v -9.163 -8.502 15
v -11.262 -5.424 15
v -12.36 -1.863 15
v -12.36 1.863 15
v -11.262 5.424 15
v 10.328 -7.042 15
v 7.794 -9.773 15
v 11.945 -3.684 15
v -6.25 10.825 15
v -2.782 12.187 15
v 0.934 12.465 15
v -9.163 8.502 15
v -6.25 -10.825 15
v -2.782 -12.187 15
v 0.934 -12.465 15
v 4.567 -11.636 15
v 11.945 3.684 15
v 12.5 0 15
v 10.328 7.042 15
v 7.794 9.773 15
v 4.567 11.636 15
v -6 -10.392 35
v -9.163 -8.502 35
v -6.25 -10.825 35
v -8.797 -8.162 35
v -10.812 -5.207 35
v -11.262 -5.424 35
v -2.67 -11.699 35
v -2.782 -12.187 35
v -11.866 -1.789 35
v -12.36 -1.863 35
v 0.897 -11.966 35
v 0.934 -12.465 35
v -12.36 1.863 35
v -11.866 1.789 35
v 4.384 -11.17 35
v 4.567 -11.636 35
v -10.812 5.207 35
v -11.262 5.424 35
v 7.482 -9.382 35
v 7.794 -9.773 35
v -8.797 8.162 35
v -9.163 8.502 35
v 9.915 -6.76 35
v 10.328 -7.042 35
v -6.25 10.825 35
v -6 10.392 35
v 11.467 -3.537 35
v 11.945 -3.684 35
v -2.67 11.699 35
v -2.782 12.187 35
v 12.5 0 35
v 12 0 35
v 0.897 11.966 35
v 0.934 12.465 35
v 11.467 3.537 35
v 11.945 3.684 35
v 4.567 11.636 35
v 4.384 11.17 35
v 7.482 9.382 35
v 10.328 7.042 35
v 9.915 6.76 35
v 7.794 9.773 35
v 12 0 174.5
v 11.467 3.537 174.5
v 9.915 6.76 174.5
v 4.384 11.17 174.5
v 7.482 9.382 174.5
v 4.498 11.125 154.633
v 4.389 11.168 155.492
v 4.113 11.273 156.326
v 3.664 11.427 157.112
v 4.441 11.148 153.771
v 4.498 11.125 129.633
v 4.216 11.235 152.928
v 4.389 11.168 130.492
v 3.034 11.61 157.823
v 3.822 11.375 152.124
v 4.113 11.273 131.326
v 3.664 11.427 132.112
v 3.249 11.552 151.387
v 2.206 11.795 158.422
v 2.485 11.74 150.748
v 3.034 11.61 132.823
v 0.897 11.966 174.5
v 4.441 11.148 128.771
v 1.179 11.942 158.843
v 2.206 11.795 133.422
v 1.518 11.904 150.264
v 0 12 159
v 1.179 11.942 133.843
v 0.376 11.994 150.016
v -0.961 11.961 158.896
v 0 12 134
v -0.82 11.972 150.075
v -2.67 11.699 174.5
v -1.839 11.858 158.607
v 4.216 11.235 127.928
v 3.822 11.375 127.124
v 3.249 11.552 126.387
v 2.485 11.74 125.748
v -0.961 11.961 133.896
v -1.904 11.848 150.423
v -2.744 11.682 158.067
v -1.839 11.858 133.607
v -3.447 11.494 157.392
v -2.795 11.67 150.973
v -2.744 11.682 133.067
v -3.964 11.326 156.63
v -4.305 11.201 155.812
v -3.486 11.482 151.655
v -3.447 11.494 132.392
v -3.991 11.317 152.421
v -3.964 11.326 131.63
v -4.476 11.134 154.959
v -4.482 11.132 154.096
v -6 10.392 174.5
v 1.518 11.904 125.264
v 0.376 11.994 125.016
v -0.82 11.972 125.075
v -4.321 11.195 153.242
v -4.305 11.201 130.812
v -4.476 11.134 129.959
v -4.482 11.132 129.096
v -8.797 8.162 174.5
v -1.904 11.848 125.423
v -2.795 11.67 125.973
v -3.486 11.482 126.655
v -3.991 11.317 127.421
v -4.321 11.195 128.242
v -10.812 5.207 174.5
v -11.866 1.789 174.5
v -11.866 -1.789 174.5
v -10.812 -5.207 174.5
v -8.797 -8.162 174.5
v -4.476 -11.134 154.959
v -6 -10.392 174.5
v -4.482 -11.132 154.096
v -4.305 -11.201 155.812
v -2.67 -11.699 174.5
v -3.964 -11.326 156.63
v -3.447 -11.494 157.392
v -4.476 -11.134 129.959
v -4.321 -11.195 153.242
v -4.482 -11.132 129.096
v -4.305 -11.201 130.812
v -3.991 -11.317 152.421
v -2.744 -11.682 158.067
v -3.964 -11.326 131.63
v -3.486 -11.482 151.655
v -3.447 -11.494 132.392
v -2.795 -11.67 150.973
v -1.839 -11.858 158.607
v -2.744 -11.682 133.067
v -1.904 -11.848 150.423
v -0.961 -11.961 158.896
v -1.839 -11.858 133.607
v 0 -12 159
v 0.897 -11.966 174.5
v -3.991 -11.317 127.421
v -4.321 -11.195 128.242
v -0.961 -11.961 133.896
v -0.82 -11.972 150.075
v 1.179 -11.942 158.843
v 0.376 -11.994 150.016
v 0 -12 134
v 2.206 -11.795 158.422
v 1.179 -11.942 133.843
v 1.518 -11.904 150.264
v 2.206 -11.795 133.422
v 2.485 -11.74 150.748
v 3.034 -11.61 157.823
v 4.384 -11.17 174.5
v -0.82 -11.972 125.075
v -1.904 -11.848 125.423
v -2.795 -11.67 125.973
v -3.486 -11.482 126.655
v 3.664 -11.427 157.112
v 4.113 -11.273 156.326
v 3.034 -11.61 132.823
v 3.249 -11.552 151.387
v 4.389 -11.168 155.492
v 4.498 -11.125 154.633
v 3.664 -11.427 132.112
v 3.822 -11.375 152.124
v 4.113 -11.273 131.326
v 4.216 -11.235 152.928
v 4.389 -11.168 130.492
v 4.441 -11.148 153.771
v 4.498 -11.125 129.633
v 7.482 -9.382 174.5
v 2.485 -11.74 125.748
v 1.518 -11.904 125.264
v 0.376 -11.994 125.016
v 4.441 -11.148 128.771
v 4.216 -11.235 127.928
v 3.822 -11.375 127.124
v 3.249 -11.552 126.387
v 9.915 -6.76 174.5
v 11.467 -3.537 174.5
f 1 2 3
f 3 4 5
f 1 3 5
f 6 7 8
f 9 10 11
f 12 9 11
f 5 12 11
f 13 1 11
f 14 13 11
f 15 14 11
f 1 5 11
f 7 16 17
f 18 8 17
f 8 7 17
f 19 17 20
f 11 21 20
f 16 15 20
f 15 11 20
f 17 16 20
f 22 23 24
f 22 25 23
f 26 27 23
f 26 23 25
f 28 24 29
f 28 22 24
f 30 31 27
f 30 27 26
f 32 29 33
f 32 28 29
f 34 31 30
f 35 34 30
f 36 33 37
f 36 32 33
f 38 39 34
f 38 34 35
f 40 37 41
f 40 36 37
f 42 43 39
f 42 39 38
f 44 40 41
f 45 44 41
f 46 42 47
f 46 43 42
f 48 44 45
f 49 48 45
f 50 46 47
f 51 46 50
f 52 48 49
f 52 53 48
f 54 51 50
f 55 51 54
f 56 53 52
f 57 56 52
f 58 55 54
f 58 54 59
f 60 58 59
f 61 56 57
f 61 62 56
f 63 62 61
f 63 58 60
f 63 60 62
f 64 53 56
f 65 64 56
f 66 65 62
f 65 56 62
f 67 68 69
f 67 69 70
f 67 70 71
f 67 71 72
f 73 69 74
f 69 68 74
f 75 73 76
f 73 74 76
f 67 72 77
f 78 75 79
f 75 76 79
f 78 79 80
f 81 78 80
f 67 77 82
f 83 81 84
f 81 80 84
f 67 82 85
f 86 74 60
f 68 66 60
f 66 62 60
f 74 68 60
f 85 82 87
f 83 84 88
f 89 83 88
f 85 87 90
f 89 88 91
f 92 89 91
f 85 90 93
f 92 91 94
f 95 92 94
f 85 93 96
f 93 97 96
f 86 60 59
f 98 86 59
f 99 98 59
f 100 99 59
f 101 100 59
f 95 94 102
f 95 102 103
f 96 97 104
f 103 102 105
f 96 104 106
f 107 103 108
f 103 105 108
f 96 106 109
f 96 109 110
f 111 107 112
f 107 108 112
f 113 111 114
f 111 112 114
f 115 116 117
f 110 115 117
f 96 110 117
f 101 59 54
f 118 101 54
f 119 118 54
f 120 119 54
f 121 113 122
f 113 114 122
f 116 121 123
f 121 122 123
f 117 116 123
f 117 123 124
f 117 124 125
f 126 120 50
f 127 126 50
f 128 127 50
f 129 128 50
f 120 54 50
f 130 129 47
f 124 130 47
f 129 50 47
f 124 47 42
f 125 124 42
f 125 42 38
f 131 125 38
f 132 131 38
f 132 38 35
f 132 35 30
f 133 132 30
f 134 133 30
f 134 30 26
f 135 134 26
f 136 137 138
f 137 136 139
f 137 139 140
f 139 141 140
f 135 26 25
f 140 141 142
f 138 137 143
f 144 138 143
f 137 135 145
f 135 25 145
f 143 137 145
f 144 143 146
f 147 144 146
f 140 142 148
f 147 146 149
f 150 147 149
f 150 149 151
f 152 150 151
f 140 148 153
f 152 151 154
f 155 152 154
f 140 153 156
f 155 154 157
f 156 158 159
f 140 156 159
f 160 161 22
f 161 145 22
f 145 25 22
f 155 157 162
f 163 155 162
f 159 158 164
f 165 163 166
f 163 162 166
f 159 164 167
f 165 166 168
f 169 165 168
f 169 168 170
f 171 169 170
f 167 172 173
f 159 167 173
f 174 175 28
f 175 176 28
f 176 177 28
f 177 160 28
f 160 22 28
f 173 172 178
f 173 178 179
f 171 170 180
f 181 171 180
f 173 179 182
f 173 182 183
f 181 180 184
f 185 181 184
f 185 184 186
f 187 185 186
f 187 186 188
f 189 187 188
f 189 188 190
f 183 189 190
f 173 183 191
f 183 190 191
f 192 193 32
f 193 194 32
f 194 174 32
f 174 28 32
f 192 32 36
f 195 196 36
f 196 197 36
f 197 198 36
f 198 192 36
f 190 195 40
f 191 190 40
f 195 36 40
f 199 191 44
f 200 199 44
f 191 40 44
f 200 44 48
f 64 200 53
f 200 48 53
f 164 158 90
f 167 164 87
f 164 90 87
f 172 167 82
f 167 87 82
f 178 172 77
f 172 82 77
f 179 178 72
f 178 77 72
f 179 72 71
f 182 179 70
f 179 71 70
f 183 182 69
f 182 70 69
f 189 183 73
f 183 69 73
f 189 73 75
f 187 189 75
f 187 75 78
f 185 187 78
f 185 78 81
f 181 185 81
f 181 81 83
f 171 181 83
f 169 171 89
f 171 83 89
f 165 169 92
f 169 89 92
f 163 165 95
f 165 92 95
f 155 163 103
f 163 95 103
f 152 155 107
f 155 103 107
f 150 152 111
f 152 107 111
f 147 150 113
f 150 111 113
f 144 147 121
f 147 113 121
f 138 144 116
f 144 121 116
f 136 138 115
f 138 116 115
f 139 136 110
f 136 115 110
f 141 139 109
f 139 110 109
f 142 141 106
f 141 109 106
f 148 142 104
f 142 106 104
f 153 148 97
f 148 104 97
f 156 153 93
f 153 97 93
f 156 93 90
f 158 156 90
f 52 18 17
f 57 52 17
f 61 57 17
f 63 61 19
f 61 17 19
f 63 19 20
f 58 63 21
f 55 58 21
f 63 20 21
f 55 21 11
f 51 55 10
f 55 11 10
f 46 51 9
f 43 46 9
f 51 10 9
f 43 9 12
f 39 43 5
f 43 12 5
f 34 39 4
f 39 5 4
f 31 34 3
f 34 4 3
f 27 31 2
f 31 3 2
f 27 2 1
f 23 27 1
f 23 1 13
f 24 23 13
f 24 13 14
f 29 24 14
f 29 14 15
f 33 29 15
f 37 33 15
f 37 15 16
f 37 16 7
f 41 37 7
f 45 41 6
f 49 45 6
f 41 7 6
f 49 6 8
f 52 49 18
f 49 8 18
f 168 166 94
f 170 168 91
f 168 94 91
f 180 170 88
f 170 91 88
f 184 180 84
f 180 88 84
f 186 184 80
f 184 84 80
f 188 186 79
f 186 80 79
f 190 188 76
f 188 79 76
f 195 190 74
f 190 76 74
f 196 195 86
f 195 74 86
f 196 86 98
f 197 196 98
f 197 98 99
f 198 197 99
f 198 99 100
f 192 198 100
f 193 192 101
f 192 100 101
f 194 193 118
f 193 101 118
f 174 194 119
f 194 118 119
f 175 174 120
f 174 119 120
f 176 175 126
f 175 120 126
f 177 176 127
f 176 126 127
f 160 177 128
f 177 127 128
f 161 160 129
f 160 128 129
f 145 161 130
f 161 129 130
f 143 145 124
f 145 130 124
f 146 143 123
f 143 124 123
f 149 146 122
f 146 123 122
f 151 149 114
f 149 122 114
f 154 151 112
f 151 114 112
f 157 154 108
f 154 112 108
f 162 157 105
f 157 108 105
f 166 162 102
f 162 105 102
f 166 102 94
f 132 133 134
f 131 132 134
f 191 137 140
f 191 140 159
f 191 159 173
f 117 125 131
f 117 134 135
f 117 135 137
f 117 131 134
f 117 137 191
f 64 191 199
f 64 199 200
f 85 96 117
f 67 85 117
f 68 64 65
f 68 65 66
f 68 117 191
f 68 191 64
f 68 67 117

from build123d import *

# Parameters (mm, degrees)
SKETCH1_R               = 10
BOSS_EXTRUDE1_DEPTH     = 15
SKETCH2_R               = 12.5
BOSS_EXTRUDE2_DEPTH     = 20
SKETCH3_R               = 12
BOSS_EXTRUDE3_DEPTH     = 139.5
SKETCH4_R               = 4.5
CUT_EXTRUDE1_DEPTH      = 176.393129854
CUT_EXTRUDE2_DEPTH      = 176.393129954
CUT_EXTRUDE2_DEPTH_BACK = 176.393129954
SKETCH5_W               = 50.129657838
SKETCH5_H               = 19.874218845
LPATTERN1_COUNT         = 2
LPATTERN1_PITCH         = 25


with BuildPart() as part:
    # Sketch1 → Boss-Extrude1 (new body)
    with BuildSketch(Plane.XY):
        Circle(SKETCH1_R)
    extrude(amount=BOSS_EXTRUDE1_DEPTH)

    # Sketch2 → Boss-Extrude2 (add)
    with BuildSketch(Plane.XY.offset(15)):
        Circle(SKETCH2_R)
    extrude(amount=BOSS_EXTRUDE2_DEPTH)

    # Sketch3 → Boss-Extrude3 (add)
    with BuildSketch(Plane.XY.offset(35)):
        Circle(SKETCH3_R)
    extrude(amount=BOSS_EXTRUDE3_DEPTH)

    # Sketch4 → Cut-Extrude1 (cut, symmetric)
    with BuildSketch(Plane(origin=(0, 0, 0), x_dir=(1, 0, 0), z_dir=(0, 1, 0))):
        with Locations(Location((0, -154.5, 0), (0, 0, 270))):
            Circle(SKETCH4_R)
    cut_extrude1 = extrude(amount=CUT_EXTRUDE1_DEPTH, both=True, mode=Mode.SUBTRACT)

    # Sketch5 → Cut-Extrude2 (cut, two sides: drawn at the far end of the back side and taken through both)
    with BuildSketch(Plane(origin=(0, 0, 0), x_dir=(1, 0, 0), z_dir=(0, 1, 0)).offset(-CUT_EXTRUDE2_DEPTH_BACK)):
        with Locations((-12.564828919, -5.062890578)):
            Rectangle(SKETCH5_W, SKETCH5_H)
    extrude(amount=CUT_EXTRUDE2_DEPTH + CUT_EXTRUDE2_DEPTH_BACK, mode=Mode.SUBTRACT)

    # LPattern1: Cut-Extrude1 ×2
    with Locations(*[(0, 0, -i * LPATTERN1_PITCH) for i in range(1, LPATTERN1_COUNT)]):
        add(cut_extrude1, mode=Mode.SUBTRACT)


solid = part.part
